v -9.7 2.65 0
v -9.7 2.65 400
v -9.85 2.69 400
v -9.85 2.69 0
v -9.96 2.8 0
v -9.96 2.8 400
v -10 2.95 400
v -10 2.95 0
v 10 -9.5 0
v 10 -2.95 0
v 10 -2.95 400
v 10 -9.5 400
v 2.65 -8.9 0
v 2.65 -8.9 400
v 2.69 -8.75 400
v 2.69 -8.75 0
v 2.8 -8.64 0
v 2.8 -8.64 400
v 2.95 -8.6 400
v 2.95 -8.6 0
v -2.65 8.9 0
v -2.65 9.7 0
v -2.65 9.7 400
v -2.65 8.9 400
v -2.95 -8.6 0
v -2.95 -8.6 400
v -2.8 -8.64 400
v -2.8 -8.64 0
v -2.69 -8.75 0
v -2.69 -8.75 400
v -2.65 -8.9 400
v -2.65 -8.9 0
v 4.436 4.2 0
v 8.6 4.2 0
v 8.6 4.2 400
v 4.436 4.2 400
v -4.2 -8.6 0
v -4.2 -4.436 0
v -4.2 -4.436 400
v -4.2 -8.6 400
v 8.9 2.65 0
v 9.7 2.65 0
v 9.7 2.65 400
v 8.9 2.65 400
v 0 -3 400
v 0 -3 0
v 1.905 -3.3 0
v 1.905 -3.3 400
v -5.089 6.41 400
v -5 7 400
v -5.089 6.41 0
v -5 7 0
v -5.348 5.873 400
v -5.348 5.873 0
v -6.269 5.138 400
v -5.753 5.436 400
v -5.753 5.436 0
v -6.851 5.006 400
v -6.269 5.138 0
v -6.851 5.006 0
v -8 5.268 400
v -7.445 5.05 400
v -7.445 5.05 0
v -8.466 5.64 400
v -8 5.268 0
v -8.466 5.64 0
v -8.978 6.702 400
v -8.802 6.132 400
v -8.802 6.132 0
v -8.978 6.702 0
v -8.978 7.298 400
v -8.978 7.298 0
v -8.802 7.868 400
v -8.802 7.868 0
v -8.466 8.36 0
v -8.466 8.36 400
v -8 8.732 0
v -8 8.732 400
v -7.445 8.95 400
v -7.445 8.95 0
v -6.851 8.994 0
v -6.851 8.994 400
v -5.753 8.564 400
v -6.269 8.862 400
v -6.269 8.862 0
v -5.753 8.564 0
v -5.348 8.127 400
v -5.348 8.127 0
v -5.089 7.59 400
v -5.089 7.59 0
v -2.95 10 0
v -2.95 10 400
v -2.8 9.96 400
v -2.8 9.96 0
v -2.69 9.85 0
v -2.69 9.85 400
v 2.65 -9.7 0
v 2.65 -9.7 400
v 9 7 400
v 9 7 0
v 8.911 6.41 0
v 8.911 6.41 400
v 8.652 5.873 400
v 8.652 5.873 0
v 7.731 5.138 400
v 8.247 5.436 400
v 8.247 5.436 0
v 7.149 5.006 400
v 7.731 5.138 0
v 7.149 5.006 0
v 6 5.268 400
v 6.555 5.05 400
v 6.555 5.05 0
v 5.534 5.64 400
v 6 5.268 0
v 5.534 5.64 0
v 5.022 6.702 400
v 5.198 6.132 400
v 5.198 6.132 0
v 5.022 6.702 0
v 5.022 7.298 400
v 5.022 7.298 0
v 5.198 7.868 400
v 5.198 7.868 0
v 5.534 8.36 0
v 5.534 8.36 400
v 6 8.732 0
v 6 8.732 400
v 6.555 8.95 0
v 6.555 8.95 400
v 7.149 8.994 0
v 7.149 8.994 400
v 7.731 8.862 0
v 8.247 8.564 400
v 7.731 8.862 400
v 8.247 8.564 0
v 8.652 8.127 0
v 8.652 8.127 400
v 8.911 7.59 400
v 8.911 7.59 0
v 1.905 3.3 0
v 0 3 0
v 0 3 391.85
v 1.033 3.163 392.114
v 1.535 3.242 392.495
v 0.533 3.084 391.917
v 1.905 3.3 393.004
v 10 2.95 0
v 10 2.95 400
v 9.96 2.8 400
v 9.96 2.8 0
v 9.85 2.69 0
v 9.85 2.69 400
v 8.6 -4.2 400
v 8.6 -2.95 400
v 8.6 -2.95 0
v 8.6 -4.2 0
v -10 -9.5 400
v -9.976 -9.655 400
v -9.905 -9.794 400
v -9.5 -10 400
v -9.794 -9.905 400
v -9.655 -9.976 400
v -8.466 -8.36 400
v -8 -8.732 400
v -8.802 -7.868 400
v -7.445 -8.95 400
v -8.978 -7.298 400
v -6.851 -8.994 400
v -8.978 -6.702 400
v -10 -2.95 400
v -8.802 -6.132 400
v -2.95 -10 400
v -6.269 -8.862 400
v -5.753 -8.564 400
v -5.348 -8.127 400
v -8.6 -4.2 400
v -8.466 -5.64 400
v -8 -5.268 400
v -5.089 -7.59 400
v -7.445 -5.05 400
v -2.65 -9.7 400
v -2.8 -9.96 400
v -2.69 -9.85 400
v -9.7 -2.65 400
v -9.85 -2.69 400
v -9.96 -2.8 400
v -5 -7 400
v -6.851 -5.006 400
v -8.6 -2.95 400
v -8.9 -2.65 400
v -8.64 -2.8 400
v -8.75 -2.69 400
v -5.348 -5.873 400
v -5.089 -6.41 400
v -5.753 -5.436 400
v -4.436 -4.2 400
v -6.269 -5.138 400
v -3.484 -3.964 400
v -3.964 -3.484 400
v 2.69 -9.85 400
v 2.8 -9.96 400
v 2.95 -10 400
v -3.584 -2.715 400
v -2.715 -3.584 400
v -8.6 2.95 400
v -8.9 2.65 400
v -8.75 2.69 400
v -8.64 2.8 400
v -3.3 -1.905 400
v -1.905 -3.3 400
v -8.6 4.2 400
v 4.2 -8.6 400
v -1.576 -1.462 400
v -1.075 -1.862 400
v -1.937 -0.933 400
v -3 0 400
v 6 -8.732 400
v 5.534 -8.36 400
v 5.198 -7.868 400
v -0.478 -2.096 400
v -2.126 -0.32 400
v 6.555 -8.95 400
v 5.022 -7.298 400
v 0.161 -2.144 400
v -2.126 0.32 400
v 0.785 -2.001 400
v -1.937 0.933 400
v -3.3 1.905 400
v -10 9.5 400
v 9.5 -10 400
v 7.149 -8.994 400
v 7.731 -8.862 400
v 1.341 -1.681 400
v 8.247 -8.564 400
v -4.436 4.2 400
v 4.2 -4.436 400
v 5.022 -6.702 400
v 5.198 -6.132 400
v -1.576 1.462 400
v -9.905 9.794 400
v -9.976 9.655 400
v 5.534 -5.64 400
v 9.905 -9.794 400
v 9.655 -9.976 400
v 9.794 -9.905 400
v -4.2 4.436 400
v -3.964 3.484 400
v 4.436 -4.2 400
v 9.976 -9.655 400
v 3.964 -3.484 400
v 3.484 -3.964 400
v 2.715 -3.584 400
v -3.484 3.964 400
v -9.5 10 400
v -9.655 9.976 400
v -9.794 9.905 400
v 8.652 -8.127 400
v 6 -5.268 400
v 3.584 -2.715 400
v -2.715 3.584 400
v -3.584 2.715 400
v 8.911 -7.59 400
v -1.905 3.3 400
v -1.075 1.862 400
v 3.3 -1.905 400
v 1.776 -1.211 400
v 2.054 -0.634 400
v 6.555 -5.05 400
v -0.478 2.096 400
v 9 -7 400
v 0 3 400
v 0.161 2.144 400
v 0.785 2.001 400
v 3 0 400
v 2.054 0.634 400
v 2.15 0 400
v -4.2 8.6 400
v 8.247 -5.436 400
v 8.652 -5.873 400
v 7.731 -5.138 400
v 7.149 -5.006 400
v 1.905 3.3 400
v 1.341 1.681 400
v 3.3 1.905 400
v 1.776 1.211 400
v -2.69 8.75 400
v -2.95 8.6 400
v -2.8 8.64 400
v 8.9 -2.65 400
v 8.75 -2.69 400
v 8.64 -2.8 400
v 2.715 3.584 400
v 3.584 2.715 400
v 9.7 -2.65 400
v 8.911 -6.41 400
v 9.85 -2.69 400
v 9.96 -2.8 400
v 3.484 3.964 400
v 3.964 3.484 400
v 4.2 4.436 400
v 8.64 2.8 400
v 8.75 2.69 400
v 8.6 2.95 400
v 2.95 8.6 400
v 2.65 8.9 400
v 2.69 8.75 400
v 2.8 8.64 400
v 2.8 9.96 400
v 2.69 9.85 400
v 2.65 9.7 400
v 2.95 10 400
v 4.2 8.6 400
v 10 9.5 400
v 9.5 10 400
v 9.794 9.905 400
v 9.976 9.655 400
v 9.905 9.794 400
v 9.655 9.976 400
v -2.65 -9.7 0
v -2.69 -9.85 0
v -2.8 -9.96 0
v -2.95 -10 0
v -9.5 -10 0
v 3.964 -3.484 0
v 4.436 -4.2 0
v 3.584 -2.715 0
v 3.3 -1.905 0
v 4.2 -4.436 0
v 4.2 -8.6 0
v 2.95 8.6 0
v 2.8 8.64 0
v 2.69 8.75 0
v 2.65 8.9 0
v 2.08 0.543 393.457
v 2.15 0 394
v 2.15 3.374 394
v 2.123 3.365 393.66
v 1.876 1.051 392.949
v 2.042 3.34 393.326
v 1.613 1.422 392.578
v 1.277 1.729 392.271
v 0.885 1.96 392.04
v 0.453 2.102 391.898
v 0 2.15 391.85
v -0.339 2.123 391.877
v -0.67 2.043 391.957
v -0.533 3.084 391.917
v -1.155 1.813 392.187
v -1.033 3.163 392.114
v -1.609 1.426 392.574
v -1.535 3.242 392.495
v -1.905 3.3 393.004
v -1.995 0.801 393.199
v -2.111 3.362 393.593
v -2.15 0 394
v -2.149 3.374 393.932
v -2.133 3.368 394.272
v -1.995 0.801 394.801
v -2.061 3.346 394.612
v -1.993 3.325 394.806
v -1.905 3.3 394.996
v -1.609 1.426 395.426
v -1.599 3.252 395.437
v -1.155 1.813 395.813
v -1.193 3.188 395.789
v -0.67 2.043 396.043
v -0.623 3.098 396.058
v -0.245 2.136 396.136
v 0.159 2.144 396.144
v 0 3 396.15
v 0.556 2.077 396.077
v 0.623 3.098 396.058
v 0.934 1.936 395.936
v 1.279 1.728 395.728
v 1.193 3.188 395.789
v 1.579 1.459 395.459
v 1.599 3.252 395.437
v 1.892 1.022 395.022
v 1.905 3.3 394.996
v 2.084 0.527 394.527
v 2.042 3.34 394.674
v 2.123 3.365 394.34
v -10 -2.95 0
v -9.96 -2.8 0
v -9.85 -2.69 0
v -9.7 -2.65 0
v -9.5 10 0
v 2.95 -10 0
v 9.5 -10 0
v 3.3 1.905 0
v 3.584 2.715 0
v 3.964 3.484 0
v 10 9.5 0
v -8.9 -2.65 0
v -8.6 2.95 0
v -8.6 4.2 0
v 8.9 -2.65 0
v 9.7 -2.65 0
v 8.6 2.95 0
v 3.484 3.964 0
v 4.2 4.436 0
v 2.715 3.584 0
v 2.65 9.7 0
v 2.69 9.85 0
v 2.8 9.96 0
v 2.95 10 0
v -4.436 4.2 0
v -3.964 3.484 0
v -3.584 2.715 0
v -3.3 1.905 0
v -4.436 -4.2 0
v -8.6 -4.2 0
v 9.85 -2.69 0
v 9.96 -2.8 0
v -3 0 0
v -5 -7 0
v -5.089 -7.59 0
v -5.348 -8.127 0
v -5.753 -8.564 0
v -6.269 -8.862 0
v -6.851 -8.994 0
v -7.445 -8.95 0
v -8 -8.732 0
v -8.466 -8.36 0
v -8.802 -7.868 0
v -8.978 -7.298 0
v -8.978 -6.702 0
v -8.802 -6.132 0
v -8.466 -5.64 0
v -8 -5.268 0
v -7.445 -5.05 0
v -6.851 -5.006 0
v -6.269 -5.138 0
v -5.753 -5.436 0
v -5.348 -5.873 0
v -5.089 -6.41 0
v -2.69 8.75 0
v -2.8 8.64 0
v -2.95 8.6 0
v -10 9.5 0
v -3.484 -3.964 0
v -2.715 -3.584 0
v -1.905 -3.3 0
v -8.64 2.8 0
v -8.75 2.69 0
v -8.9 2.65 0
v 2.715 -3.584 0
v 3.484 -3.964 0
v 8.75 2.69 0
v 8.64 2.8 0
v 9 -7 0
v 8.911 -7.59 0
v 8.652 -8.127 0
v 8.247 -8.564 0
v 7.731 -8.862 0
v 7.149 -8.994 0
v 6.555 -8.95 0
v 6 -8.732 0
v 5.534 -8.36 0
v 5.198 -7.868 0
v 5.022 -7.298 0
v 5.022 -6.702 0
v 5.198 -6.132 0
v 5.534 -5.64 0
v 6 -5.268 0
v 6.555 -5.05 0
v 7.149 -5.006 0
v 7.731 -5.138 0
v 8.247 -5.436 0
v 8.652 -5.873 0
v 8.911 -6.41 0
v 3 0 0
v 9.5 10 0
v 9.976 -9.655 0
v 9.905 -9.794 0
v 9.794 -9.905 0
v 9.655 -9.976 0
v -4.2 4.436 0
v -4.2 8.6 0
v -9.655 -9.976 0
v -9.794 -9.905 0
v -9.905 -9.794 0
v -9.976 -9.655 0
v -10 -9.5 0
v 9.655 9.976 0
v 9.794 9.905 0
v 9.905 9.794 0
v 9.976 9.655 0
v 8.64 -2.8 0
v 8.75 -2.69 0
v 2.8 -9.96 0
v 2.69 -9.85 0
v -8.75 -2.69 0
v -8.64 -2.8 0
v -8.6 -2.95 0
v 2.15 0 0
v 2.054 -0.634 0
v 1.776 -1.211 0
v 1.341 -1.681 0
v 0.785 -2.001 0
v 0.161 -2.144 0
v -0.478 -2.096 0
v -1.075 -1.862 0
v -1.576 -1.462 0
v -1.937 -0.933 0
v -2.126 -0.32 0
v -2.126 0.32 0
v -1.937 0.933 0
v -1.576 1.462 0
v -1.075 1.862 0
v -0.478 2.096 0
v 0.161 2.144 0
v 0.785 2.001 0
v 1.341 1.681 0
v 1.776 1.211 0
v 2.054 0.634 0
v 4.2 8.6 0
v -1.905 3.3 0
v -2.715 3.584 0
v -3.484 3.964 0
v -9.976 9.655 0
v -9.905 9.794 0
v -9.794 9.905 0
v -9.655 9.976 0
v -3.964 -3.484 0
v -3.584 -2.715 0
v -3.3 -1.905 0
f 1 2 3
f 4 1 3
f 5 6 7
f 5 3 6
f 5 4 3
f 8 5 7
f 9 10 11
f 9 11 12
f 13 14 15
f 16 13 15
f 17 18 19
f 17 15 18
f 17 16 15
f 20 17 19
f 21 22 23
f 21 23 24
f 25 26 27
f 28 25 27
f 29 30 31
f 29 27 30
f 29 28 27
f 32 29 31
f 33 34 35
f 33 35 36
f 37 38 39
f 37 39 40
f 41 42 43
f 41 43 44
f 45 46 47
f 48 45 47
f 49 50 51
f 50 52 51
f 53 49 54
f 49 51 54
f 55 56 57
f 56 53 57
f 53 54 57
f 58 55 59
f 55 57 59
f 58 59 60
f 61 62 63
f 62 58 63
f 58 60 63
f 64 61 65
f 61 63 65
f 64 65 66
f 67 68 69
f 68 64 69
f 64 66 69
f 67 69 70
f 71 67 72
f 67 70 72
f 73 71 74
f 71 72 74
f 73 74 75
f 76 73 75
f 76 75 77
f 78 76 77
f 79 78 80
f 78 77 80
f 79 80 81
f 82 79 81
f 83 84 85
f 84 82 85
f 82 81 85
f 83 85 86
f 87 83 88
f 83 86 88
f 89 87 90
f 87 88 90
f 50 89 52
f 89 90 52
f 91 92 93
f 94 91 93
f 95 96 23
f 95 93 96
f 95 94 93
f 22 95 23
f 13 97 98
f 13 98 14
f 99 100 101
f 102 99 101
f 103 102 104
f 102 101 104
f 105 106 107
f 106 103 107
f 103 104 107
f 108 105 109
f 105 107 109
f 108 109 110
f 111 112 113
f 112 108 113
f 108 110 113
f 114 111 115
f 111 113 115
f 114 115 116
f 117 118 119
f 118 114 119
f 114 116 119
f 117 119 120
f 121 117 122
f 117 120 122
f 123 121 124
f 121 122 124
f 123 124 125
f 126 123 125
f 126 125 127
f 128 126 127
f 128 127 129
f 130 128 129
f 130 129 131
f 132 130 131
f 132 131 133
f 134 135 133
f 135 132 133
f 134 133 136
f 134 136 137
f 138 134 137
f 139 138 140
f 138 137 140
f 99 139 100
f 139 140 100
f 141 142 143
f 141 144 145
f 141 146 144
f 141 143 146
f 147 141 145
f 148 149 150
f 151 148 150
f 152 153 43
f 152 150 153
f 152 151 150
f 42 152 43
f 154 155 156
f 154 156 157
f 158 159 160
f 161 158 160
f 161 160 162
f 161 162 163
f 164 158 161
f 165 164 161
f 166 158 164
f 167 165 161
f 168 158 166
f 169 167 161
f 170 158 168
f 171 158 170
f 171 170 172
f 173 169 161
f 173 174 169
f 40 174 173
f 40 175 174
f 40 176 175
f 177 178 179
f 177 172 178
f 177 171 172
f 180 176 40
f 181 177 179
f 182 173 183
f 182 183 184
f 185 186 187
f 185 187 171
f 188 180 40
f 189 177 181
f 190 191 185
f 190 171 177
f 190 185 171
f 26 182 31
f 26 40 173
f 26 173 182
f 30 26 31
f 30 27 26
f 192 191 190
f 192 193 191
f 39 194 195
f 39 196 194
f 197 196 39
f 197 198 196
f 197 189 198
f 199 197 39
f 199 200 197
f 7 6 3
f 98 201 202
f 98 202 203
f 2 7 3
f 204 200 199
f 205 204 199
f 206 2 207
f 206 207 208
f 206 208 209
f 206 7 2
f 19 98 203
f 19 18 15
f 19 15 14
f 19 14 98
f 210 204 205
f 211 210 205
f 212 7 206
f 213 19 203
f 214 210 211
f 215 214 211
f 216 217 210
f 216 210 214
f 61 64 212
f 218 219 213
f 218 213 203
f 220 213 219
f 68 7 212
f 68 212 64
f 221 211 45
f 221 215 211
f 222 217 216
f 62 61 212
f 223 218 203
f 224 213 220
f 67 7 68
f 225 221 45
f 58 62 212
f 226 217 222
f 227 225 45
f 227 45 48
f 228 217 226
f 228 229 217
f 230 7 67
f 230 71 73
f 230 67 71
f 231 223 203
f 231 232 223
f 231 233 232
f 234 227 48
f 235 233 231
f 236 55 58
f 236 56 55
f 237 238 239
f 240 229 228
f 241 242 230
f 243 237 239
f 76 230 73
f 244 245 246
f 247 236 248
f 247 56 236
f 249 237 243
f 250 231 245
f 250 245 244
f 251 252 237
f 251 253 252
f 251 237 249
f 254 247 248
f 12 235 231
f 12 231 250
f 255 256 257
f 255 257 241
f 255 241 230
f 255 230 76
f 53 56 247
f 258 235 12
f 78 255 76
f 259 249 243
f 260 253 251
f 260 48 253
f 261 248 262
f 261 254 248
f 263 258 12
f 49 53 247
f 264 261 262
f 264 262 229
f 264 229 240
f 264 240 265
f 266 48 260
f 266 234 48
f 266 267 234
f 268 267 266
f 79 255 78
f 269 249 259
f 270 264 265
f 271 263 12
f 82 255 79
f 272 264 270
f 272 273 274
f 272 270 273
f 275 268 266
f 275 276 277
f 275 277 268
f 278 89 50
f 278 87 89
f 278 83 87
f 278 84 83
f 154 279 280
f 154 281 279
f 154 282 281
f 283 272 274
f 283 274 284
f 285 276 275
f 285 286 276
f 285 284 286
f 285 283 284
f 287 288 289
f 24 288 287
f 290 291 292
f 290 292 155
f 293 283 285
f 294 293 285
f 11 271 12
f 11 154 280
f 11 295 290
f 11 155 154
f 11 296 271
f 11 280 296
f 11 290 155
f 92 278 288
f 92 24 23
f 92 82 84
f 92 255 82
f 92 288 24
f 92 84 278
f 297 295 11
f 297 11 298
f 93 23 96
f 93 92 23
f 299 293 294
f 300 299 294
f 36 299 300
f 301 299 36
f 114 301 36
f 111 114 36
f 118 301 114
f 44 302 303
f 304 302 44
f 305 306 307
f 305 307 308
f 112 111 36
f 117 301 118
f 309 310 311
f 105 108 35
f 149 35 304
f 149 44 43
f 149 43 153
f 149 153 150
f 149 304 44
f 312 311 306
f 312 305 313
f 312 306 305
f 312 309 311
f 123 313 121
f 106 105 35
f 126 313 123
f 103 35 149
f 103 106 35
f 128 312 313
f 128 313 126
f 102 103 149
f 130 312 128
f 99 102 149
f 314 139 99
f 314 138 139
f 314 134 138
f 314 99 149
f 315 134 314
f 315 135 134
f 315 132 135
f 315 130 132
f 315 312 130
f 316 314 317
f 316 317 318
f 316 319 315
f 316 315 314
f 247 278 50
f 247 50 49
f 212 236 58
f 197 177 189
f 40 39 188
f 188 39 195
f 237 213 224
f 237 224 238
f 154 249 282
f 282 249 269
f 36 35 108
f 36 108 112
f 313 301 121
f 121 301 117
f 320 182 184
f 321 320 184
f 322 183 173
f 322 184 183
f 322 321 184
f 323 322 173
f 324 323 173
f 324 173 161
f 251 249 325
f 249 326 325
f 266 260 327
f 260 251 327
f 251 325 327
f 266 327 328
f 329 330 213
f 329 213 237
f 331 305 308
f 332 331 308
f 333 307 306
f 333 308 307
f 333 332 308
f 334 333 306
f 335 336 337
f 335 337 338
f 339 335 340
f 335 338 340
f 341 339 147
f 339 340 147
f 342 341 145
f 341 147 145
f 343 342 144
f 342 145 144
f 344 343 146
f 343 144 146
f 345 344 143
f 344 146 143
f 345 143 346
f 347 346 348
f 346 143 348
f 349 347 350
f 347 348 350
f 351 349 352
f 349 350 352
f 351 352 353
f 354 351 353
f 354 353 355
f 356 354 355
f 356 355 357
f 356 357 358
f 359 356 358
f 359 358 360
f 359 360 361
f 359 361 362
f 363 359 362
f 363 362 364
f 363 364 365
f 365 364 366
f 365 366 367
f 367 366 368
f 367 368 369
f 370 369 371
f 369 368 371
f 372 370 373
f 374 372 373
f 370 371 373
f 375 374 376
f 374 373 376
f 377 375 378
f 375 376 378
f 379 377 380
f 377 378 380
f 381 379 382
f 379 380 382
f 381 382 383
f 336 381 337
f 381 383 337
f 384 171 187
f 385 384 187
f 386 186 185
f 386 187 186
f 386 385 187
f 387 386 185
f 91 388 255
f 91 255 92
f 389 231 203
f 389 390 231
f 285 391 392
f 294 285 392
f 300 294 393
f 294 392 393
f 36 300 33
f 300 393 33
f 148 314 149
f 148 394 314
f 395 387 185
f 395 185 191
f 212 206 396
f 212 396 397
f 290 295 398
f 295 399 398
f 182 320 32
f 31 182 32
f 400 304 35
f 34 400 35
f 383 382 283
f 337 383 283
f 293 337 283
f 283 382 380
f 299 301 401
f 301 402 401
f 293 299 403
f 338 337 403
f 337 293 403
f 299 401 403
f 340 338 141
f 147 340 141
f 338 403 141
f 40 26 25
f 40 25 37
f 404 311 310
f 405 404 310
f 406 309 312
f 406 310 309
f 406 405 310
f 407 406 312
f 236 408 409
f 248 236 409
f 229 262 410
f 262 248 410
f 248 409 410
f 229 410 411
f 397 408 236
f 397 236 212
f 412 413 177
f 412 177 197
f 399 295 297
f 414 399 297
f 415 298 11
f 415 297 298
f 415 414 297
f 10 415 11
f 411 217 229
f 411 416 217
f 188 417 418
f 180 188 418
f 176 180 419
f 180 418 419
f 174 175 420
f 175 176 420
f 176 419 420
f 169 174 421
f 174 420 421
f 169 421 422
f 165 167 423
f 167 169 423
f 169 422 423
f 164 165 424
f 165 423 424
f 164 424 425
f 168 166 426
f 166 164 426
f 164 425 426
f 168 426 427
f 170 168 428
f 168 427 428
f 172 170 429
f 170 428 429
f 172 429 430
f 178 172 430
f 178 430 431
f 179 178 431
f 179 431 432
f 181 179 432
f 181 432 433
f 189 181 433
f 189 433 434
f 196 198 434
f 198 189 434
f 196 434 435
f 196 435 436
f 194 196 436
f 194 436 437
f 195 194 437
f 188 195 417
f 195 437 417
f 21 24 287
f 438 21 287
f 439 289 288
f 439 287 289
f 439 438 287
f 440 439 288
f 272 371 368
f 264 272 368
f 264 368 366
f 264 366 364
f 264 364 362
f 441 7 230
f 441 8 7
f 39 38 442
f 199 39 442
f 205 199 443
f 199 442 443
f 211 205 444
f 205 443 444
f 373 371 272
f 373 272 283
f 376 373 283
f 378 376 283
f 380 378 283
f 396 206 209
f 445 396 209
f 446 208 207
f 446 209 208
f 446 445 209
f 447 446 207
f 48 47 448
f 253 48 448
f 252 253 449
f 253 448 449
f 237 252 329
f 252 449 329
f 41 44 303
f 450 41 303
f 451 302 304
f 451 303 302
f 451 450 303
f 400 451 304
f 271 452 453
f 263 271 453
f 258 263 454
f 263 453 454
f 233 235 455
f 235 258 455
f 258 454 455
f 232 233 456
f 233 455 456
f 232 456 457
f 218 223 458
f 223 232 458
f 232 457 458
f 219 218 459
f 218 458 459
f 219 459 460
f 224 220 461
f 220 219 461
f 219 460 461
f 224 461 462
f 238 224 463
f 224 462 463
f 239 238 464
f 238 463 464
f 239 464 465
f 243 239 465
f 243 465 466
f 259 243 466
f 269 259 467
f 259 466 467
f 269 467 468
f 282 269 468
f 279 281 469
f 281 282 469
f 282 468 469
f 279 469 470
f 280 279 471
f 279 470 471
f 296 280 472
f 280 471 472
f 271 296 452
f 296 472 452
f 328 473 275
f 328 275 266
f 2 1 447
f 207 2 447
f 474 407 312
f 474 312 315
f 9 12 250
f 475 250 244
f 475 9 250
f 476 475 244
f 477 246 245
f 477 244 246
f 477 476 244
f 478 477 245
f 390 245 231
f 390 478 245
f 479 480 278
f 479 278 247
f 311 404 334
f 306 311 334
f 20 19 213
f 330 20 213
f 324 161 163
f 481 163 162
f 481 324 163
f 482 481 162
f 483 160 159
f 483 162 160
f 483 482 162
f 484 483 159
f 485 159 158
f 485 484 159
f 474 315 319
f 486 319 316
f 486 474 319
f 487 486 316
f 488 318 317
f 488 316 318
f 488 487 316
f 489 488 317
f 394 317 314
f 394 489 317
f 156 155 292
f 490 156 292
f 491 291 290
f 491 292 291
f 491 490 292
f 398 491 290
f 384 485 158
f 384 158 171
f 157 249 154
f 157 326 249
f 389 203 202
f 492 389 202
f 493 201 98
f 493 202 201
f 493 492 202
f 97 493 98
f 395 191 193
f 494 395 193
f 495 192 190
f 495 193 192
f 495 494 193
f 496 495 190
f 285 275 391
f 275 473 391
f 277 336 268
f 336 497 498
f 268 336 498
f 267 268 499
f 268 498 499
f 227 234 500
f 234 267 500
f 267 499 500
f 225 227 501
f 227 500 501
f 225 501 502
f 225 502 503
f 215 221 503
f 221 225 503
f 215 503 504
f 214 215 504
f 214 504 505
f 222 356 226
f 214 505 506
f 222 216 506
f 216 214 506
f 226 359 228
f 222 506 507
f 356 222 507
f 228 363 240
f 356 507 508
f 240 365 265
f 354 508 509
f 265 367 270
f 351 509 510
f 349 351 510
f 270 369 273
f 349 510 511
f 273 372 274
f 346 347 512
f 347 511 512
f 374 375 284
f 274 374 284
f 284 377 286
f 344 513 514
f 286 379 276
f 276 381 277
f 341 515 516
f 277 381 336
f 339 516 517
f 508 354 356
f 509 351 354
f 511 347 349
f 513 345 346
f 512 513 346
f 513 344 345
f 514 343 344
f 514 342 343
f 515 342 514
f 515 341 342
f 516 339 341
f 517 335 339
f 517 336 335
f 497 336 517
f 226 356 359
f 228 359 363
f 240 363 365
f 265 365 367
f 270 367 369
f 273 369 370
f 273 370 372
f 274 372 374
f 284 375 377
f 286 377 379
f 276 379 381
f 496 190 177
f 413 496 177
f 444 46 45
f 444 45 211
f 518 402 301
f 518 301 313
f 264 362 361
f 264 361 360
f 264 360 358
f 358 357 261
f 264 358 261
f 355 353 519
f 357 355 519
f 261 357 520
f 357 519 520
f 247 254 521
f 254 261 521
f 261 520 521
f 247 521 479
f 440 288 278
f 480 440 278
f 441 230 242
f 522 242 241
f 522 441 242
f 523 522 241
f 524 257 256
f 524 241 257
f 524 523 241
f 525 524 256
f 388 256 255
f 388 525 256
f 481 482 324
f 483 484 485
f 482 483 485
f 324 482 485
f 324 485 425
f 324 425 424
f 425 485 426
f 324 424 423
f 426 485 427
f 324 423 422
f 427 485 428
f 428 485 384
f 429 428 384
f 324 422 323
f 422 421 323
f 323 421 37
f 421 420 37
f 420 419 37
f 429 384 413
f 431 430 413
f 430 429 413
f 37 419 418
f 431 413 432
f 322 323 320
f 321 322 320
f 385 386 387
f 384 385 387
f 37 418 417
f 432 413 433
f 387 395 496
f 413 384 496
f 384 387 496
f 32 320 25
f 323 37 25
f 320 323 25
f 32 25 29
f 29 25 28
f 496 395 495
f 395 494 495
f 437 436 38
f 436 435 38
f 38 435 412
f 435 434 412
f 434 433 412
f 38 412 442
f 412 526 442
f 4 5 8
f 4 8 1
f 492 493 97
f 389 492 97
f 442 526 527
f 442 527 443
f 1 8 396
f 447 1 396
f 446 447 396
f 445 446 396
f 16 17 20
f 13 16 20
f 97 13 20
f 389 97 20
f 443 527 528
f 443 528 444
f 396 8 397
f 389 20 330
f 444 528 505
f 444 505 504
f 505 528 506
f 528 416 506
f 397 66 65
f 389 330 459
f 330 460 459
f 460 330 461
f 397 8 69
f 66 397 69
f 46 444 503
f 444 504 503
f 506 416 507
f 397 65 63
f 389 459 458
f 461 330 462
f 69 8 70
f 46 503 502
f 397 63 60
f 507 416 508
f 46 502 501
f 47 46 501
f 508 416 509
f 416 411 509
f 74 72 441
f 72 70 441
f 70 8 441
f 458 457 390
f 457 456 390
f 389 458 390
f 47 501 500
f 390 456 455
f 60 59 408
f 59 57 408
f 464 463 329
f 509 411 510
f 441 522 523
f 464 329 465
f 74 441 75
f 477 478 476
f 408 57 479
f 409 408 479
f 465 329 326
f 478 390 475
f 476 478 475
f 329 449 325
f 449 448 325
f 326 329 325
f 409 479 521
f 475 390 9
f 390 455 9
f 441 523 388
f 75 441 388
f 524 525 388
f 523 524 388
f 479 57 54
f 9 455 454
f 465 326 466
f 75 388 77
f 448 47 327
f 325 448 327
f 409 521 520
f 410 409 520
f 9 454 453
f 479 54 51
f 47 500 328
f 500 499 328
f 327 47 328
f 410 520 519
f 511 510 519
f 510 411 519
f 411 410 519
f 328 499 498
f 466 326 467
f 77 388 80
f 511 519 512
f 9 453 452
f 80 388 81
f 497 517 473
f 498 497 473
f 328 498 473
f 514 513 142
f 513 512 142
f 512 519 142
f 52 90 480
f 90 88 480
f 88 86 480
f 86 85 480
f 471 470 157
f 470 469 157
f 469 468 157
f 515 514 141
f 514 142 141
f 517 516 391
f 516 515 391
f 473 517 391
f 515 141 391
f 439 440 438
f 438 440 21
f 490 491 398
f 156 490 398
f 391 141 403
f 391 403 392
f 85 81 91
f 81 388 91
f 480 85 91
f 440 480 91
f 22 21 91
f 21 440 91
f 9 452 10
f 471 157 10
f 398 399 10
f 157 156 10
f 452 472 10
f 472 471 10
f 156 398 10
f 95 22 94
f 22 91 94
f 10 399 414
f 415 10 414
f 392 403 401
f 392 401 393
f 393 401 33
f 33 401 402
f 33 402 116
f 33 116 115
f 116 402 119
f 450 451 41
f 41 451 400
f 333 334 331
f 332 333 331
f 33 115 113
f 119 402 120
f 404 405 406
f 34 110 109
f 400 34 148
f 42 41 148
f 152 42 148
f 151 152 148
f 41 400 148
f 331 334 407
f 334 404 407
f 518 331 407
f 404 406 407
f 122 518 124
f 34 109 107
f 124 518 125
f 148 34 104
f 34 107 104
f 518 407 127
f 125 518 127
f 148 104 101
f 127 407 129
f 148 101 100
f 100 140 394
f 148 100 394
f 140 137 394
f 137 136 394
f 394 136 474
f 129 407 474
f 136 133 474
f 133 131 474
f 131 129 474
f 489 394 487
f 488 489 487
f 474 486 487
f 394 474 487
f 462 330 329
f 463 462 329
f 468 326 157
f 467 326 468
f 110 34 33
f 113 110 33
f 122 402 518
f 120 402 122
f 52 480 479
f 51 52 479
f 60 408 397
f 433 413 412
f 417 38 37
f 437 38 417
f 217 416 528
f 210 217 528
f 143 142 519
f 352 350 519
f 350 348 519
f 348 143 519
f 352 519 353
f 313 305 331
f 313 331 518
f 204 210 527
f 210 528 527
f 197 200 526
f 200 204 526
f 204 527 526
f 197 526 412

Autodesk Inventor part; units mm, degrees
ref_plane "YZ Plane" through (0, 0, 0) normal (1, 0, 0) x (0, 1, 0)
ref_plane "XZ Plane" through (0, 0, 0) normal (0, 1, 0) x (-1, 0, 0)
ref_plane "XY Plane" through (0, 0, 0) normal (0, 0, 1) x (1, 0, 0)
sketch "Sketch1" plane through (0, 0, 0) normal (0, 0, 1) x (1, 0, 0)
  line L0 (0, 0) -> (12.2143, 12.2143) construction
  line L1 (0, 0) -> (10, 0) construction
  circle A0 centre (0, 0) radius 2.15
  circle A1 centre (7, 7) radius 2
  circle A2 centre (-7, 7) radius 2
  circle A3 centre (-7, -7) radius 2
  circle A4 centre (7, -7) radius 2
  line L2 (2.95, 10) -> (9.5, 10)
  line L3 (10, 9.5) -> (10, 2.95)
  line L4 (9.7, 2.65) -> (8.9, 2.65)
  line L5 (8.6, 2.95) -> (8.6, 4.2)
  line L6 (4.2, 4.4357) -> (4.2, 8.6)
  line L7 (2.65, 9.7) -> (2.65, 8.9)
  line L8 (2.95, 8.6) -> (4.2, 8.6)
  line L9 (0, 14.2934) -> (0, -14.2934) construction
  arc A5 (2.95, 10) -> (2.65, 9.7) centre (2.95, 9.7) ccw
  arc A6 (2.65, 8.9) -> (2.95, 8.6) centre (2.95, 8.9) ccw
  arc A7 (8.6, 2.95) -> (8.9, 2.65) centre (8.9, 2.95) ccw
  arc A8 (9.7, 2.65) -> (10, 2.95) centre (9.7, 2.95) ccw
  arc A9 (10, 9.5) -> (9.5, 10) centre (9.5, 9.5) ccw
  circle A10 centre (0, 7.1516) radius 5.0016 construction
  circle A11 centre (7.1516, 0) radius 5.0016 construction
  line L10 (8.6, 4.2) -> (4.4357, 4.2)
  line L11 (0, 3) -> (1.9054, 3.3)
  arc A12 (1.9054, 3.3) -> (4.2, 4.4357) centre (0, 10.0357) ccw
  line L12 (3, 0) -> (3.3, 1.9054)
  arc A13 (4.4357, 4.2) -> (3.3, 1.9054) centre (10.0357, 0) ccw
  line L13 (-3, 0) -> (-3.3, 1.9054)
  arc A14 (-3.3, 1.9054) -> (-4.4357, 4.2) centre (-10.0357, 0) ccw
  arc A15 (-4.2, 4.4357) -> (-1.9054, 3.3) centre (0, 10.0357) ccw
  line L14 (0, 3) -> (-1.9054, 3.3)
  line L15 (-4.4357, 4.2) -> (-8.6, 4.2)
  line L16 (-8.6, 2.95) -> (-8.6, 4.2)
  arc A16 (-8.9, 2.65) -> (-8.6, 2.95) centre (-8.9, 2.95) ccw
  line L17 (-9.7, 2.65) -> (-8.9, 2.65)
  arc A17 (-10, 2.95) -> (-9.7, 2.65) centre (-9.7, 2.95) ccw
  line L18 (-10, 2.95) -> (-10, 9.5)
  arc A18 (-9.5, 10) -> (-10, 9.5) centre (-9.5, 9.5) ccw
  line L19 (-9.5, 10) -> (-2.95, 10)
  line L20 (-4.2, 8.6) -> (-4.2, 4.4357)
  line L21 (-2.95, 8.6) -> (-4.2, 8.6)
  arc A19 (-2.95, 8.6) -> (-2.65, 8.9) centre (-2.95, 8.9) ccw
  line L22 (-2.65, 9.7) -> (-2.65, 8.9)
  arc A20 (-2.65, 9.7) -> (-2.95, 10) centre (-2.95, 9.7) ccw
  line L23 (0, -3) -> (-1.9054, -3.3)
  arc A21 (-1.9054, -3.3) -> (-4.2, -4.4357) centre (0, -10.0357) ccw
  arc A22 (-4.4357, -4.2) -> (-3.3, -1.9054) centre (-10.0357, 0) ccw
  line L24 (-3, 0) -> (-3.3, -1.9054)
  line L25 (-4.2, -4.4357) -> (-4.2, -8.6)
  line L26 (-2.95, -8.6) -> (-4.2, -8.6)
  arc A23 (-2.65, -8.9) -> (-2.95, -8.6) centre (-2.95, -8.9) ccw
  line L27 (-2.65, -9.7) -> (-2.65, -8.9)
  arc A24 (-2.95, -10) -> (-2.65, -9.7) centre (-2.95, -9.7) ccw
  line L28 (-2.95, -10) -> (-9.5, -10)
  arc A25 (-10, -9.5) -> (-9.5, -10) centre (-9.5, -9.5) ccw
  line L29 (-10, -9.5) -> (-10, -2.95)
  line L30 (-8.6, -4.2) -> (-4.4357, -4.2)
  line L31 (-8.6, -2.95) -> (-8.6, -4.2)
  arc A26 (-8.6, -2.95) -> (-8.9, -2.65) centre (-8.9, -2.95) ccw
  line L32 (-9.7, -2.65) -> (-8.9, -2.65)
  arc A27 (-9.7, -2.65) -> (-10, -2.95) centre (-9.7, -2.95) ccw
  line L33 (3, 0) -> (3.3, -1.9054)
  arc A28 (3.3, -1.9054) -> (4.4357, -4.2) centre (10.0357, 0) ccw
  arc A29 (4.2, -4.4357) -> (1.9054, -3.3) centre (0, -10.0357) ccw
  line L34 (0, -3) -> (1.9054, -3.3)
  line L35 (4.4357, -4.2) -> (8.6, -4.2)
  line L36 (8.6, -2.95) -> (8.6, -4.2)
  arc A30 (8.9, -2.65) -> (8.6, -2.95) centre (8.9, -2.95) ccw
  line L37 (9.7, -2.65) -> (8.9, -2.65)
  arc A31 (10, -2.95) -> (9.7, -2.65) centre (9.7, -2.95) ccw
  line L38 (10, -2.95) -> (10, -9.5)
  arc A32 (9.5, -10) -> (10, -9.5) centre (9.5, -9.5) ccw
  line L39 (9.5, -10) -> (2.95, -10)
  line L40 (4.2, -8.6) -> (4.2, -4.4357)
  line L41 (2.95, -8.6) -> (4.2, -8.6)
  arc A33 (2.95, -8.6) -> (2.65, -8.9) centre (2.95, -8.9) ccw
  line L42 (2.65, -9.7) -> (2.65, -8.9)
  arc A34 (2.65, -9.7) -> (2.95, -10) centre (2.95, -9.7) ccw
  point P0 (10, 2.65)
  point P1 (8.6, 2.65)
  point P2 (-2.65, 10)
  point P3 (-2.65, 8.6)
  point P4 (-10, -2.65)
  point P5 (-8.6, -2.65)
  point P6 (2.65, -10)
  point P7 (2.65, -8.6)
  dimension "d1" = 45
  dimension "d2" = 4.3
  dimension "d3" = 4
  dimension "d6" = 360
  dimension "d9" = 2.65
  dimension "d10" = 4.2
  dimension "d11" = 1.4
  dimension "d12" = 7
  dimension "d13" = 10
  dimension "d14" = 10
  dimension "d15" = 1.4
  dimension "d16" = 2.65
  dimension "d18" = 0.3
  dimension "d19" = 0.5
  dimension "d22" = 4.2
  dimension "d24" = 6.7
  dimension "d25" = 0.3
  dimension "d26" = 7
  dimension "d27" = 6.7
  dimension "d28" = 0.3
  dimension "d29" = 7
  dimension "d32" = 360
extrude "Extrusion1" add sketch "Sketch1" along normal blind 400
sketch "Sketch2" plane through (2.95, 10, 400) normal (0, 1, 0) x (1, 0, 0)
  line L0 (-2.95, 400) -> (-2.95, 0) projected
  circle A0 centre (-2.95, 6) radius 2.15
  dimension "d36" = 4.3
  dimension "d37" = 6
extrude "Extrusion2" cut sketch "Sketch2" against normal blind 10
properties part number "Aluminum_Profile_2020"
